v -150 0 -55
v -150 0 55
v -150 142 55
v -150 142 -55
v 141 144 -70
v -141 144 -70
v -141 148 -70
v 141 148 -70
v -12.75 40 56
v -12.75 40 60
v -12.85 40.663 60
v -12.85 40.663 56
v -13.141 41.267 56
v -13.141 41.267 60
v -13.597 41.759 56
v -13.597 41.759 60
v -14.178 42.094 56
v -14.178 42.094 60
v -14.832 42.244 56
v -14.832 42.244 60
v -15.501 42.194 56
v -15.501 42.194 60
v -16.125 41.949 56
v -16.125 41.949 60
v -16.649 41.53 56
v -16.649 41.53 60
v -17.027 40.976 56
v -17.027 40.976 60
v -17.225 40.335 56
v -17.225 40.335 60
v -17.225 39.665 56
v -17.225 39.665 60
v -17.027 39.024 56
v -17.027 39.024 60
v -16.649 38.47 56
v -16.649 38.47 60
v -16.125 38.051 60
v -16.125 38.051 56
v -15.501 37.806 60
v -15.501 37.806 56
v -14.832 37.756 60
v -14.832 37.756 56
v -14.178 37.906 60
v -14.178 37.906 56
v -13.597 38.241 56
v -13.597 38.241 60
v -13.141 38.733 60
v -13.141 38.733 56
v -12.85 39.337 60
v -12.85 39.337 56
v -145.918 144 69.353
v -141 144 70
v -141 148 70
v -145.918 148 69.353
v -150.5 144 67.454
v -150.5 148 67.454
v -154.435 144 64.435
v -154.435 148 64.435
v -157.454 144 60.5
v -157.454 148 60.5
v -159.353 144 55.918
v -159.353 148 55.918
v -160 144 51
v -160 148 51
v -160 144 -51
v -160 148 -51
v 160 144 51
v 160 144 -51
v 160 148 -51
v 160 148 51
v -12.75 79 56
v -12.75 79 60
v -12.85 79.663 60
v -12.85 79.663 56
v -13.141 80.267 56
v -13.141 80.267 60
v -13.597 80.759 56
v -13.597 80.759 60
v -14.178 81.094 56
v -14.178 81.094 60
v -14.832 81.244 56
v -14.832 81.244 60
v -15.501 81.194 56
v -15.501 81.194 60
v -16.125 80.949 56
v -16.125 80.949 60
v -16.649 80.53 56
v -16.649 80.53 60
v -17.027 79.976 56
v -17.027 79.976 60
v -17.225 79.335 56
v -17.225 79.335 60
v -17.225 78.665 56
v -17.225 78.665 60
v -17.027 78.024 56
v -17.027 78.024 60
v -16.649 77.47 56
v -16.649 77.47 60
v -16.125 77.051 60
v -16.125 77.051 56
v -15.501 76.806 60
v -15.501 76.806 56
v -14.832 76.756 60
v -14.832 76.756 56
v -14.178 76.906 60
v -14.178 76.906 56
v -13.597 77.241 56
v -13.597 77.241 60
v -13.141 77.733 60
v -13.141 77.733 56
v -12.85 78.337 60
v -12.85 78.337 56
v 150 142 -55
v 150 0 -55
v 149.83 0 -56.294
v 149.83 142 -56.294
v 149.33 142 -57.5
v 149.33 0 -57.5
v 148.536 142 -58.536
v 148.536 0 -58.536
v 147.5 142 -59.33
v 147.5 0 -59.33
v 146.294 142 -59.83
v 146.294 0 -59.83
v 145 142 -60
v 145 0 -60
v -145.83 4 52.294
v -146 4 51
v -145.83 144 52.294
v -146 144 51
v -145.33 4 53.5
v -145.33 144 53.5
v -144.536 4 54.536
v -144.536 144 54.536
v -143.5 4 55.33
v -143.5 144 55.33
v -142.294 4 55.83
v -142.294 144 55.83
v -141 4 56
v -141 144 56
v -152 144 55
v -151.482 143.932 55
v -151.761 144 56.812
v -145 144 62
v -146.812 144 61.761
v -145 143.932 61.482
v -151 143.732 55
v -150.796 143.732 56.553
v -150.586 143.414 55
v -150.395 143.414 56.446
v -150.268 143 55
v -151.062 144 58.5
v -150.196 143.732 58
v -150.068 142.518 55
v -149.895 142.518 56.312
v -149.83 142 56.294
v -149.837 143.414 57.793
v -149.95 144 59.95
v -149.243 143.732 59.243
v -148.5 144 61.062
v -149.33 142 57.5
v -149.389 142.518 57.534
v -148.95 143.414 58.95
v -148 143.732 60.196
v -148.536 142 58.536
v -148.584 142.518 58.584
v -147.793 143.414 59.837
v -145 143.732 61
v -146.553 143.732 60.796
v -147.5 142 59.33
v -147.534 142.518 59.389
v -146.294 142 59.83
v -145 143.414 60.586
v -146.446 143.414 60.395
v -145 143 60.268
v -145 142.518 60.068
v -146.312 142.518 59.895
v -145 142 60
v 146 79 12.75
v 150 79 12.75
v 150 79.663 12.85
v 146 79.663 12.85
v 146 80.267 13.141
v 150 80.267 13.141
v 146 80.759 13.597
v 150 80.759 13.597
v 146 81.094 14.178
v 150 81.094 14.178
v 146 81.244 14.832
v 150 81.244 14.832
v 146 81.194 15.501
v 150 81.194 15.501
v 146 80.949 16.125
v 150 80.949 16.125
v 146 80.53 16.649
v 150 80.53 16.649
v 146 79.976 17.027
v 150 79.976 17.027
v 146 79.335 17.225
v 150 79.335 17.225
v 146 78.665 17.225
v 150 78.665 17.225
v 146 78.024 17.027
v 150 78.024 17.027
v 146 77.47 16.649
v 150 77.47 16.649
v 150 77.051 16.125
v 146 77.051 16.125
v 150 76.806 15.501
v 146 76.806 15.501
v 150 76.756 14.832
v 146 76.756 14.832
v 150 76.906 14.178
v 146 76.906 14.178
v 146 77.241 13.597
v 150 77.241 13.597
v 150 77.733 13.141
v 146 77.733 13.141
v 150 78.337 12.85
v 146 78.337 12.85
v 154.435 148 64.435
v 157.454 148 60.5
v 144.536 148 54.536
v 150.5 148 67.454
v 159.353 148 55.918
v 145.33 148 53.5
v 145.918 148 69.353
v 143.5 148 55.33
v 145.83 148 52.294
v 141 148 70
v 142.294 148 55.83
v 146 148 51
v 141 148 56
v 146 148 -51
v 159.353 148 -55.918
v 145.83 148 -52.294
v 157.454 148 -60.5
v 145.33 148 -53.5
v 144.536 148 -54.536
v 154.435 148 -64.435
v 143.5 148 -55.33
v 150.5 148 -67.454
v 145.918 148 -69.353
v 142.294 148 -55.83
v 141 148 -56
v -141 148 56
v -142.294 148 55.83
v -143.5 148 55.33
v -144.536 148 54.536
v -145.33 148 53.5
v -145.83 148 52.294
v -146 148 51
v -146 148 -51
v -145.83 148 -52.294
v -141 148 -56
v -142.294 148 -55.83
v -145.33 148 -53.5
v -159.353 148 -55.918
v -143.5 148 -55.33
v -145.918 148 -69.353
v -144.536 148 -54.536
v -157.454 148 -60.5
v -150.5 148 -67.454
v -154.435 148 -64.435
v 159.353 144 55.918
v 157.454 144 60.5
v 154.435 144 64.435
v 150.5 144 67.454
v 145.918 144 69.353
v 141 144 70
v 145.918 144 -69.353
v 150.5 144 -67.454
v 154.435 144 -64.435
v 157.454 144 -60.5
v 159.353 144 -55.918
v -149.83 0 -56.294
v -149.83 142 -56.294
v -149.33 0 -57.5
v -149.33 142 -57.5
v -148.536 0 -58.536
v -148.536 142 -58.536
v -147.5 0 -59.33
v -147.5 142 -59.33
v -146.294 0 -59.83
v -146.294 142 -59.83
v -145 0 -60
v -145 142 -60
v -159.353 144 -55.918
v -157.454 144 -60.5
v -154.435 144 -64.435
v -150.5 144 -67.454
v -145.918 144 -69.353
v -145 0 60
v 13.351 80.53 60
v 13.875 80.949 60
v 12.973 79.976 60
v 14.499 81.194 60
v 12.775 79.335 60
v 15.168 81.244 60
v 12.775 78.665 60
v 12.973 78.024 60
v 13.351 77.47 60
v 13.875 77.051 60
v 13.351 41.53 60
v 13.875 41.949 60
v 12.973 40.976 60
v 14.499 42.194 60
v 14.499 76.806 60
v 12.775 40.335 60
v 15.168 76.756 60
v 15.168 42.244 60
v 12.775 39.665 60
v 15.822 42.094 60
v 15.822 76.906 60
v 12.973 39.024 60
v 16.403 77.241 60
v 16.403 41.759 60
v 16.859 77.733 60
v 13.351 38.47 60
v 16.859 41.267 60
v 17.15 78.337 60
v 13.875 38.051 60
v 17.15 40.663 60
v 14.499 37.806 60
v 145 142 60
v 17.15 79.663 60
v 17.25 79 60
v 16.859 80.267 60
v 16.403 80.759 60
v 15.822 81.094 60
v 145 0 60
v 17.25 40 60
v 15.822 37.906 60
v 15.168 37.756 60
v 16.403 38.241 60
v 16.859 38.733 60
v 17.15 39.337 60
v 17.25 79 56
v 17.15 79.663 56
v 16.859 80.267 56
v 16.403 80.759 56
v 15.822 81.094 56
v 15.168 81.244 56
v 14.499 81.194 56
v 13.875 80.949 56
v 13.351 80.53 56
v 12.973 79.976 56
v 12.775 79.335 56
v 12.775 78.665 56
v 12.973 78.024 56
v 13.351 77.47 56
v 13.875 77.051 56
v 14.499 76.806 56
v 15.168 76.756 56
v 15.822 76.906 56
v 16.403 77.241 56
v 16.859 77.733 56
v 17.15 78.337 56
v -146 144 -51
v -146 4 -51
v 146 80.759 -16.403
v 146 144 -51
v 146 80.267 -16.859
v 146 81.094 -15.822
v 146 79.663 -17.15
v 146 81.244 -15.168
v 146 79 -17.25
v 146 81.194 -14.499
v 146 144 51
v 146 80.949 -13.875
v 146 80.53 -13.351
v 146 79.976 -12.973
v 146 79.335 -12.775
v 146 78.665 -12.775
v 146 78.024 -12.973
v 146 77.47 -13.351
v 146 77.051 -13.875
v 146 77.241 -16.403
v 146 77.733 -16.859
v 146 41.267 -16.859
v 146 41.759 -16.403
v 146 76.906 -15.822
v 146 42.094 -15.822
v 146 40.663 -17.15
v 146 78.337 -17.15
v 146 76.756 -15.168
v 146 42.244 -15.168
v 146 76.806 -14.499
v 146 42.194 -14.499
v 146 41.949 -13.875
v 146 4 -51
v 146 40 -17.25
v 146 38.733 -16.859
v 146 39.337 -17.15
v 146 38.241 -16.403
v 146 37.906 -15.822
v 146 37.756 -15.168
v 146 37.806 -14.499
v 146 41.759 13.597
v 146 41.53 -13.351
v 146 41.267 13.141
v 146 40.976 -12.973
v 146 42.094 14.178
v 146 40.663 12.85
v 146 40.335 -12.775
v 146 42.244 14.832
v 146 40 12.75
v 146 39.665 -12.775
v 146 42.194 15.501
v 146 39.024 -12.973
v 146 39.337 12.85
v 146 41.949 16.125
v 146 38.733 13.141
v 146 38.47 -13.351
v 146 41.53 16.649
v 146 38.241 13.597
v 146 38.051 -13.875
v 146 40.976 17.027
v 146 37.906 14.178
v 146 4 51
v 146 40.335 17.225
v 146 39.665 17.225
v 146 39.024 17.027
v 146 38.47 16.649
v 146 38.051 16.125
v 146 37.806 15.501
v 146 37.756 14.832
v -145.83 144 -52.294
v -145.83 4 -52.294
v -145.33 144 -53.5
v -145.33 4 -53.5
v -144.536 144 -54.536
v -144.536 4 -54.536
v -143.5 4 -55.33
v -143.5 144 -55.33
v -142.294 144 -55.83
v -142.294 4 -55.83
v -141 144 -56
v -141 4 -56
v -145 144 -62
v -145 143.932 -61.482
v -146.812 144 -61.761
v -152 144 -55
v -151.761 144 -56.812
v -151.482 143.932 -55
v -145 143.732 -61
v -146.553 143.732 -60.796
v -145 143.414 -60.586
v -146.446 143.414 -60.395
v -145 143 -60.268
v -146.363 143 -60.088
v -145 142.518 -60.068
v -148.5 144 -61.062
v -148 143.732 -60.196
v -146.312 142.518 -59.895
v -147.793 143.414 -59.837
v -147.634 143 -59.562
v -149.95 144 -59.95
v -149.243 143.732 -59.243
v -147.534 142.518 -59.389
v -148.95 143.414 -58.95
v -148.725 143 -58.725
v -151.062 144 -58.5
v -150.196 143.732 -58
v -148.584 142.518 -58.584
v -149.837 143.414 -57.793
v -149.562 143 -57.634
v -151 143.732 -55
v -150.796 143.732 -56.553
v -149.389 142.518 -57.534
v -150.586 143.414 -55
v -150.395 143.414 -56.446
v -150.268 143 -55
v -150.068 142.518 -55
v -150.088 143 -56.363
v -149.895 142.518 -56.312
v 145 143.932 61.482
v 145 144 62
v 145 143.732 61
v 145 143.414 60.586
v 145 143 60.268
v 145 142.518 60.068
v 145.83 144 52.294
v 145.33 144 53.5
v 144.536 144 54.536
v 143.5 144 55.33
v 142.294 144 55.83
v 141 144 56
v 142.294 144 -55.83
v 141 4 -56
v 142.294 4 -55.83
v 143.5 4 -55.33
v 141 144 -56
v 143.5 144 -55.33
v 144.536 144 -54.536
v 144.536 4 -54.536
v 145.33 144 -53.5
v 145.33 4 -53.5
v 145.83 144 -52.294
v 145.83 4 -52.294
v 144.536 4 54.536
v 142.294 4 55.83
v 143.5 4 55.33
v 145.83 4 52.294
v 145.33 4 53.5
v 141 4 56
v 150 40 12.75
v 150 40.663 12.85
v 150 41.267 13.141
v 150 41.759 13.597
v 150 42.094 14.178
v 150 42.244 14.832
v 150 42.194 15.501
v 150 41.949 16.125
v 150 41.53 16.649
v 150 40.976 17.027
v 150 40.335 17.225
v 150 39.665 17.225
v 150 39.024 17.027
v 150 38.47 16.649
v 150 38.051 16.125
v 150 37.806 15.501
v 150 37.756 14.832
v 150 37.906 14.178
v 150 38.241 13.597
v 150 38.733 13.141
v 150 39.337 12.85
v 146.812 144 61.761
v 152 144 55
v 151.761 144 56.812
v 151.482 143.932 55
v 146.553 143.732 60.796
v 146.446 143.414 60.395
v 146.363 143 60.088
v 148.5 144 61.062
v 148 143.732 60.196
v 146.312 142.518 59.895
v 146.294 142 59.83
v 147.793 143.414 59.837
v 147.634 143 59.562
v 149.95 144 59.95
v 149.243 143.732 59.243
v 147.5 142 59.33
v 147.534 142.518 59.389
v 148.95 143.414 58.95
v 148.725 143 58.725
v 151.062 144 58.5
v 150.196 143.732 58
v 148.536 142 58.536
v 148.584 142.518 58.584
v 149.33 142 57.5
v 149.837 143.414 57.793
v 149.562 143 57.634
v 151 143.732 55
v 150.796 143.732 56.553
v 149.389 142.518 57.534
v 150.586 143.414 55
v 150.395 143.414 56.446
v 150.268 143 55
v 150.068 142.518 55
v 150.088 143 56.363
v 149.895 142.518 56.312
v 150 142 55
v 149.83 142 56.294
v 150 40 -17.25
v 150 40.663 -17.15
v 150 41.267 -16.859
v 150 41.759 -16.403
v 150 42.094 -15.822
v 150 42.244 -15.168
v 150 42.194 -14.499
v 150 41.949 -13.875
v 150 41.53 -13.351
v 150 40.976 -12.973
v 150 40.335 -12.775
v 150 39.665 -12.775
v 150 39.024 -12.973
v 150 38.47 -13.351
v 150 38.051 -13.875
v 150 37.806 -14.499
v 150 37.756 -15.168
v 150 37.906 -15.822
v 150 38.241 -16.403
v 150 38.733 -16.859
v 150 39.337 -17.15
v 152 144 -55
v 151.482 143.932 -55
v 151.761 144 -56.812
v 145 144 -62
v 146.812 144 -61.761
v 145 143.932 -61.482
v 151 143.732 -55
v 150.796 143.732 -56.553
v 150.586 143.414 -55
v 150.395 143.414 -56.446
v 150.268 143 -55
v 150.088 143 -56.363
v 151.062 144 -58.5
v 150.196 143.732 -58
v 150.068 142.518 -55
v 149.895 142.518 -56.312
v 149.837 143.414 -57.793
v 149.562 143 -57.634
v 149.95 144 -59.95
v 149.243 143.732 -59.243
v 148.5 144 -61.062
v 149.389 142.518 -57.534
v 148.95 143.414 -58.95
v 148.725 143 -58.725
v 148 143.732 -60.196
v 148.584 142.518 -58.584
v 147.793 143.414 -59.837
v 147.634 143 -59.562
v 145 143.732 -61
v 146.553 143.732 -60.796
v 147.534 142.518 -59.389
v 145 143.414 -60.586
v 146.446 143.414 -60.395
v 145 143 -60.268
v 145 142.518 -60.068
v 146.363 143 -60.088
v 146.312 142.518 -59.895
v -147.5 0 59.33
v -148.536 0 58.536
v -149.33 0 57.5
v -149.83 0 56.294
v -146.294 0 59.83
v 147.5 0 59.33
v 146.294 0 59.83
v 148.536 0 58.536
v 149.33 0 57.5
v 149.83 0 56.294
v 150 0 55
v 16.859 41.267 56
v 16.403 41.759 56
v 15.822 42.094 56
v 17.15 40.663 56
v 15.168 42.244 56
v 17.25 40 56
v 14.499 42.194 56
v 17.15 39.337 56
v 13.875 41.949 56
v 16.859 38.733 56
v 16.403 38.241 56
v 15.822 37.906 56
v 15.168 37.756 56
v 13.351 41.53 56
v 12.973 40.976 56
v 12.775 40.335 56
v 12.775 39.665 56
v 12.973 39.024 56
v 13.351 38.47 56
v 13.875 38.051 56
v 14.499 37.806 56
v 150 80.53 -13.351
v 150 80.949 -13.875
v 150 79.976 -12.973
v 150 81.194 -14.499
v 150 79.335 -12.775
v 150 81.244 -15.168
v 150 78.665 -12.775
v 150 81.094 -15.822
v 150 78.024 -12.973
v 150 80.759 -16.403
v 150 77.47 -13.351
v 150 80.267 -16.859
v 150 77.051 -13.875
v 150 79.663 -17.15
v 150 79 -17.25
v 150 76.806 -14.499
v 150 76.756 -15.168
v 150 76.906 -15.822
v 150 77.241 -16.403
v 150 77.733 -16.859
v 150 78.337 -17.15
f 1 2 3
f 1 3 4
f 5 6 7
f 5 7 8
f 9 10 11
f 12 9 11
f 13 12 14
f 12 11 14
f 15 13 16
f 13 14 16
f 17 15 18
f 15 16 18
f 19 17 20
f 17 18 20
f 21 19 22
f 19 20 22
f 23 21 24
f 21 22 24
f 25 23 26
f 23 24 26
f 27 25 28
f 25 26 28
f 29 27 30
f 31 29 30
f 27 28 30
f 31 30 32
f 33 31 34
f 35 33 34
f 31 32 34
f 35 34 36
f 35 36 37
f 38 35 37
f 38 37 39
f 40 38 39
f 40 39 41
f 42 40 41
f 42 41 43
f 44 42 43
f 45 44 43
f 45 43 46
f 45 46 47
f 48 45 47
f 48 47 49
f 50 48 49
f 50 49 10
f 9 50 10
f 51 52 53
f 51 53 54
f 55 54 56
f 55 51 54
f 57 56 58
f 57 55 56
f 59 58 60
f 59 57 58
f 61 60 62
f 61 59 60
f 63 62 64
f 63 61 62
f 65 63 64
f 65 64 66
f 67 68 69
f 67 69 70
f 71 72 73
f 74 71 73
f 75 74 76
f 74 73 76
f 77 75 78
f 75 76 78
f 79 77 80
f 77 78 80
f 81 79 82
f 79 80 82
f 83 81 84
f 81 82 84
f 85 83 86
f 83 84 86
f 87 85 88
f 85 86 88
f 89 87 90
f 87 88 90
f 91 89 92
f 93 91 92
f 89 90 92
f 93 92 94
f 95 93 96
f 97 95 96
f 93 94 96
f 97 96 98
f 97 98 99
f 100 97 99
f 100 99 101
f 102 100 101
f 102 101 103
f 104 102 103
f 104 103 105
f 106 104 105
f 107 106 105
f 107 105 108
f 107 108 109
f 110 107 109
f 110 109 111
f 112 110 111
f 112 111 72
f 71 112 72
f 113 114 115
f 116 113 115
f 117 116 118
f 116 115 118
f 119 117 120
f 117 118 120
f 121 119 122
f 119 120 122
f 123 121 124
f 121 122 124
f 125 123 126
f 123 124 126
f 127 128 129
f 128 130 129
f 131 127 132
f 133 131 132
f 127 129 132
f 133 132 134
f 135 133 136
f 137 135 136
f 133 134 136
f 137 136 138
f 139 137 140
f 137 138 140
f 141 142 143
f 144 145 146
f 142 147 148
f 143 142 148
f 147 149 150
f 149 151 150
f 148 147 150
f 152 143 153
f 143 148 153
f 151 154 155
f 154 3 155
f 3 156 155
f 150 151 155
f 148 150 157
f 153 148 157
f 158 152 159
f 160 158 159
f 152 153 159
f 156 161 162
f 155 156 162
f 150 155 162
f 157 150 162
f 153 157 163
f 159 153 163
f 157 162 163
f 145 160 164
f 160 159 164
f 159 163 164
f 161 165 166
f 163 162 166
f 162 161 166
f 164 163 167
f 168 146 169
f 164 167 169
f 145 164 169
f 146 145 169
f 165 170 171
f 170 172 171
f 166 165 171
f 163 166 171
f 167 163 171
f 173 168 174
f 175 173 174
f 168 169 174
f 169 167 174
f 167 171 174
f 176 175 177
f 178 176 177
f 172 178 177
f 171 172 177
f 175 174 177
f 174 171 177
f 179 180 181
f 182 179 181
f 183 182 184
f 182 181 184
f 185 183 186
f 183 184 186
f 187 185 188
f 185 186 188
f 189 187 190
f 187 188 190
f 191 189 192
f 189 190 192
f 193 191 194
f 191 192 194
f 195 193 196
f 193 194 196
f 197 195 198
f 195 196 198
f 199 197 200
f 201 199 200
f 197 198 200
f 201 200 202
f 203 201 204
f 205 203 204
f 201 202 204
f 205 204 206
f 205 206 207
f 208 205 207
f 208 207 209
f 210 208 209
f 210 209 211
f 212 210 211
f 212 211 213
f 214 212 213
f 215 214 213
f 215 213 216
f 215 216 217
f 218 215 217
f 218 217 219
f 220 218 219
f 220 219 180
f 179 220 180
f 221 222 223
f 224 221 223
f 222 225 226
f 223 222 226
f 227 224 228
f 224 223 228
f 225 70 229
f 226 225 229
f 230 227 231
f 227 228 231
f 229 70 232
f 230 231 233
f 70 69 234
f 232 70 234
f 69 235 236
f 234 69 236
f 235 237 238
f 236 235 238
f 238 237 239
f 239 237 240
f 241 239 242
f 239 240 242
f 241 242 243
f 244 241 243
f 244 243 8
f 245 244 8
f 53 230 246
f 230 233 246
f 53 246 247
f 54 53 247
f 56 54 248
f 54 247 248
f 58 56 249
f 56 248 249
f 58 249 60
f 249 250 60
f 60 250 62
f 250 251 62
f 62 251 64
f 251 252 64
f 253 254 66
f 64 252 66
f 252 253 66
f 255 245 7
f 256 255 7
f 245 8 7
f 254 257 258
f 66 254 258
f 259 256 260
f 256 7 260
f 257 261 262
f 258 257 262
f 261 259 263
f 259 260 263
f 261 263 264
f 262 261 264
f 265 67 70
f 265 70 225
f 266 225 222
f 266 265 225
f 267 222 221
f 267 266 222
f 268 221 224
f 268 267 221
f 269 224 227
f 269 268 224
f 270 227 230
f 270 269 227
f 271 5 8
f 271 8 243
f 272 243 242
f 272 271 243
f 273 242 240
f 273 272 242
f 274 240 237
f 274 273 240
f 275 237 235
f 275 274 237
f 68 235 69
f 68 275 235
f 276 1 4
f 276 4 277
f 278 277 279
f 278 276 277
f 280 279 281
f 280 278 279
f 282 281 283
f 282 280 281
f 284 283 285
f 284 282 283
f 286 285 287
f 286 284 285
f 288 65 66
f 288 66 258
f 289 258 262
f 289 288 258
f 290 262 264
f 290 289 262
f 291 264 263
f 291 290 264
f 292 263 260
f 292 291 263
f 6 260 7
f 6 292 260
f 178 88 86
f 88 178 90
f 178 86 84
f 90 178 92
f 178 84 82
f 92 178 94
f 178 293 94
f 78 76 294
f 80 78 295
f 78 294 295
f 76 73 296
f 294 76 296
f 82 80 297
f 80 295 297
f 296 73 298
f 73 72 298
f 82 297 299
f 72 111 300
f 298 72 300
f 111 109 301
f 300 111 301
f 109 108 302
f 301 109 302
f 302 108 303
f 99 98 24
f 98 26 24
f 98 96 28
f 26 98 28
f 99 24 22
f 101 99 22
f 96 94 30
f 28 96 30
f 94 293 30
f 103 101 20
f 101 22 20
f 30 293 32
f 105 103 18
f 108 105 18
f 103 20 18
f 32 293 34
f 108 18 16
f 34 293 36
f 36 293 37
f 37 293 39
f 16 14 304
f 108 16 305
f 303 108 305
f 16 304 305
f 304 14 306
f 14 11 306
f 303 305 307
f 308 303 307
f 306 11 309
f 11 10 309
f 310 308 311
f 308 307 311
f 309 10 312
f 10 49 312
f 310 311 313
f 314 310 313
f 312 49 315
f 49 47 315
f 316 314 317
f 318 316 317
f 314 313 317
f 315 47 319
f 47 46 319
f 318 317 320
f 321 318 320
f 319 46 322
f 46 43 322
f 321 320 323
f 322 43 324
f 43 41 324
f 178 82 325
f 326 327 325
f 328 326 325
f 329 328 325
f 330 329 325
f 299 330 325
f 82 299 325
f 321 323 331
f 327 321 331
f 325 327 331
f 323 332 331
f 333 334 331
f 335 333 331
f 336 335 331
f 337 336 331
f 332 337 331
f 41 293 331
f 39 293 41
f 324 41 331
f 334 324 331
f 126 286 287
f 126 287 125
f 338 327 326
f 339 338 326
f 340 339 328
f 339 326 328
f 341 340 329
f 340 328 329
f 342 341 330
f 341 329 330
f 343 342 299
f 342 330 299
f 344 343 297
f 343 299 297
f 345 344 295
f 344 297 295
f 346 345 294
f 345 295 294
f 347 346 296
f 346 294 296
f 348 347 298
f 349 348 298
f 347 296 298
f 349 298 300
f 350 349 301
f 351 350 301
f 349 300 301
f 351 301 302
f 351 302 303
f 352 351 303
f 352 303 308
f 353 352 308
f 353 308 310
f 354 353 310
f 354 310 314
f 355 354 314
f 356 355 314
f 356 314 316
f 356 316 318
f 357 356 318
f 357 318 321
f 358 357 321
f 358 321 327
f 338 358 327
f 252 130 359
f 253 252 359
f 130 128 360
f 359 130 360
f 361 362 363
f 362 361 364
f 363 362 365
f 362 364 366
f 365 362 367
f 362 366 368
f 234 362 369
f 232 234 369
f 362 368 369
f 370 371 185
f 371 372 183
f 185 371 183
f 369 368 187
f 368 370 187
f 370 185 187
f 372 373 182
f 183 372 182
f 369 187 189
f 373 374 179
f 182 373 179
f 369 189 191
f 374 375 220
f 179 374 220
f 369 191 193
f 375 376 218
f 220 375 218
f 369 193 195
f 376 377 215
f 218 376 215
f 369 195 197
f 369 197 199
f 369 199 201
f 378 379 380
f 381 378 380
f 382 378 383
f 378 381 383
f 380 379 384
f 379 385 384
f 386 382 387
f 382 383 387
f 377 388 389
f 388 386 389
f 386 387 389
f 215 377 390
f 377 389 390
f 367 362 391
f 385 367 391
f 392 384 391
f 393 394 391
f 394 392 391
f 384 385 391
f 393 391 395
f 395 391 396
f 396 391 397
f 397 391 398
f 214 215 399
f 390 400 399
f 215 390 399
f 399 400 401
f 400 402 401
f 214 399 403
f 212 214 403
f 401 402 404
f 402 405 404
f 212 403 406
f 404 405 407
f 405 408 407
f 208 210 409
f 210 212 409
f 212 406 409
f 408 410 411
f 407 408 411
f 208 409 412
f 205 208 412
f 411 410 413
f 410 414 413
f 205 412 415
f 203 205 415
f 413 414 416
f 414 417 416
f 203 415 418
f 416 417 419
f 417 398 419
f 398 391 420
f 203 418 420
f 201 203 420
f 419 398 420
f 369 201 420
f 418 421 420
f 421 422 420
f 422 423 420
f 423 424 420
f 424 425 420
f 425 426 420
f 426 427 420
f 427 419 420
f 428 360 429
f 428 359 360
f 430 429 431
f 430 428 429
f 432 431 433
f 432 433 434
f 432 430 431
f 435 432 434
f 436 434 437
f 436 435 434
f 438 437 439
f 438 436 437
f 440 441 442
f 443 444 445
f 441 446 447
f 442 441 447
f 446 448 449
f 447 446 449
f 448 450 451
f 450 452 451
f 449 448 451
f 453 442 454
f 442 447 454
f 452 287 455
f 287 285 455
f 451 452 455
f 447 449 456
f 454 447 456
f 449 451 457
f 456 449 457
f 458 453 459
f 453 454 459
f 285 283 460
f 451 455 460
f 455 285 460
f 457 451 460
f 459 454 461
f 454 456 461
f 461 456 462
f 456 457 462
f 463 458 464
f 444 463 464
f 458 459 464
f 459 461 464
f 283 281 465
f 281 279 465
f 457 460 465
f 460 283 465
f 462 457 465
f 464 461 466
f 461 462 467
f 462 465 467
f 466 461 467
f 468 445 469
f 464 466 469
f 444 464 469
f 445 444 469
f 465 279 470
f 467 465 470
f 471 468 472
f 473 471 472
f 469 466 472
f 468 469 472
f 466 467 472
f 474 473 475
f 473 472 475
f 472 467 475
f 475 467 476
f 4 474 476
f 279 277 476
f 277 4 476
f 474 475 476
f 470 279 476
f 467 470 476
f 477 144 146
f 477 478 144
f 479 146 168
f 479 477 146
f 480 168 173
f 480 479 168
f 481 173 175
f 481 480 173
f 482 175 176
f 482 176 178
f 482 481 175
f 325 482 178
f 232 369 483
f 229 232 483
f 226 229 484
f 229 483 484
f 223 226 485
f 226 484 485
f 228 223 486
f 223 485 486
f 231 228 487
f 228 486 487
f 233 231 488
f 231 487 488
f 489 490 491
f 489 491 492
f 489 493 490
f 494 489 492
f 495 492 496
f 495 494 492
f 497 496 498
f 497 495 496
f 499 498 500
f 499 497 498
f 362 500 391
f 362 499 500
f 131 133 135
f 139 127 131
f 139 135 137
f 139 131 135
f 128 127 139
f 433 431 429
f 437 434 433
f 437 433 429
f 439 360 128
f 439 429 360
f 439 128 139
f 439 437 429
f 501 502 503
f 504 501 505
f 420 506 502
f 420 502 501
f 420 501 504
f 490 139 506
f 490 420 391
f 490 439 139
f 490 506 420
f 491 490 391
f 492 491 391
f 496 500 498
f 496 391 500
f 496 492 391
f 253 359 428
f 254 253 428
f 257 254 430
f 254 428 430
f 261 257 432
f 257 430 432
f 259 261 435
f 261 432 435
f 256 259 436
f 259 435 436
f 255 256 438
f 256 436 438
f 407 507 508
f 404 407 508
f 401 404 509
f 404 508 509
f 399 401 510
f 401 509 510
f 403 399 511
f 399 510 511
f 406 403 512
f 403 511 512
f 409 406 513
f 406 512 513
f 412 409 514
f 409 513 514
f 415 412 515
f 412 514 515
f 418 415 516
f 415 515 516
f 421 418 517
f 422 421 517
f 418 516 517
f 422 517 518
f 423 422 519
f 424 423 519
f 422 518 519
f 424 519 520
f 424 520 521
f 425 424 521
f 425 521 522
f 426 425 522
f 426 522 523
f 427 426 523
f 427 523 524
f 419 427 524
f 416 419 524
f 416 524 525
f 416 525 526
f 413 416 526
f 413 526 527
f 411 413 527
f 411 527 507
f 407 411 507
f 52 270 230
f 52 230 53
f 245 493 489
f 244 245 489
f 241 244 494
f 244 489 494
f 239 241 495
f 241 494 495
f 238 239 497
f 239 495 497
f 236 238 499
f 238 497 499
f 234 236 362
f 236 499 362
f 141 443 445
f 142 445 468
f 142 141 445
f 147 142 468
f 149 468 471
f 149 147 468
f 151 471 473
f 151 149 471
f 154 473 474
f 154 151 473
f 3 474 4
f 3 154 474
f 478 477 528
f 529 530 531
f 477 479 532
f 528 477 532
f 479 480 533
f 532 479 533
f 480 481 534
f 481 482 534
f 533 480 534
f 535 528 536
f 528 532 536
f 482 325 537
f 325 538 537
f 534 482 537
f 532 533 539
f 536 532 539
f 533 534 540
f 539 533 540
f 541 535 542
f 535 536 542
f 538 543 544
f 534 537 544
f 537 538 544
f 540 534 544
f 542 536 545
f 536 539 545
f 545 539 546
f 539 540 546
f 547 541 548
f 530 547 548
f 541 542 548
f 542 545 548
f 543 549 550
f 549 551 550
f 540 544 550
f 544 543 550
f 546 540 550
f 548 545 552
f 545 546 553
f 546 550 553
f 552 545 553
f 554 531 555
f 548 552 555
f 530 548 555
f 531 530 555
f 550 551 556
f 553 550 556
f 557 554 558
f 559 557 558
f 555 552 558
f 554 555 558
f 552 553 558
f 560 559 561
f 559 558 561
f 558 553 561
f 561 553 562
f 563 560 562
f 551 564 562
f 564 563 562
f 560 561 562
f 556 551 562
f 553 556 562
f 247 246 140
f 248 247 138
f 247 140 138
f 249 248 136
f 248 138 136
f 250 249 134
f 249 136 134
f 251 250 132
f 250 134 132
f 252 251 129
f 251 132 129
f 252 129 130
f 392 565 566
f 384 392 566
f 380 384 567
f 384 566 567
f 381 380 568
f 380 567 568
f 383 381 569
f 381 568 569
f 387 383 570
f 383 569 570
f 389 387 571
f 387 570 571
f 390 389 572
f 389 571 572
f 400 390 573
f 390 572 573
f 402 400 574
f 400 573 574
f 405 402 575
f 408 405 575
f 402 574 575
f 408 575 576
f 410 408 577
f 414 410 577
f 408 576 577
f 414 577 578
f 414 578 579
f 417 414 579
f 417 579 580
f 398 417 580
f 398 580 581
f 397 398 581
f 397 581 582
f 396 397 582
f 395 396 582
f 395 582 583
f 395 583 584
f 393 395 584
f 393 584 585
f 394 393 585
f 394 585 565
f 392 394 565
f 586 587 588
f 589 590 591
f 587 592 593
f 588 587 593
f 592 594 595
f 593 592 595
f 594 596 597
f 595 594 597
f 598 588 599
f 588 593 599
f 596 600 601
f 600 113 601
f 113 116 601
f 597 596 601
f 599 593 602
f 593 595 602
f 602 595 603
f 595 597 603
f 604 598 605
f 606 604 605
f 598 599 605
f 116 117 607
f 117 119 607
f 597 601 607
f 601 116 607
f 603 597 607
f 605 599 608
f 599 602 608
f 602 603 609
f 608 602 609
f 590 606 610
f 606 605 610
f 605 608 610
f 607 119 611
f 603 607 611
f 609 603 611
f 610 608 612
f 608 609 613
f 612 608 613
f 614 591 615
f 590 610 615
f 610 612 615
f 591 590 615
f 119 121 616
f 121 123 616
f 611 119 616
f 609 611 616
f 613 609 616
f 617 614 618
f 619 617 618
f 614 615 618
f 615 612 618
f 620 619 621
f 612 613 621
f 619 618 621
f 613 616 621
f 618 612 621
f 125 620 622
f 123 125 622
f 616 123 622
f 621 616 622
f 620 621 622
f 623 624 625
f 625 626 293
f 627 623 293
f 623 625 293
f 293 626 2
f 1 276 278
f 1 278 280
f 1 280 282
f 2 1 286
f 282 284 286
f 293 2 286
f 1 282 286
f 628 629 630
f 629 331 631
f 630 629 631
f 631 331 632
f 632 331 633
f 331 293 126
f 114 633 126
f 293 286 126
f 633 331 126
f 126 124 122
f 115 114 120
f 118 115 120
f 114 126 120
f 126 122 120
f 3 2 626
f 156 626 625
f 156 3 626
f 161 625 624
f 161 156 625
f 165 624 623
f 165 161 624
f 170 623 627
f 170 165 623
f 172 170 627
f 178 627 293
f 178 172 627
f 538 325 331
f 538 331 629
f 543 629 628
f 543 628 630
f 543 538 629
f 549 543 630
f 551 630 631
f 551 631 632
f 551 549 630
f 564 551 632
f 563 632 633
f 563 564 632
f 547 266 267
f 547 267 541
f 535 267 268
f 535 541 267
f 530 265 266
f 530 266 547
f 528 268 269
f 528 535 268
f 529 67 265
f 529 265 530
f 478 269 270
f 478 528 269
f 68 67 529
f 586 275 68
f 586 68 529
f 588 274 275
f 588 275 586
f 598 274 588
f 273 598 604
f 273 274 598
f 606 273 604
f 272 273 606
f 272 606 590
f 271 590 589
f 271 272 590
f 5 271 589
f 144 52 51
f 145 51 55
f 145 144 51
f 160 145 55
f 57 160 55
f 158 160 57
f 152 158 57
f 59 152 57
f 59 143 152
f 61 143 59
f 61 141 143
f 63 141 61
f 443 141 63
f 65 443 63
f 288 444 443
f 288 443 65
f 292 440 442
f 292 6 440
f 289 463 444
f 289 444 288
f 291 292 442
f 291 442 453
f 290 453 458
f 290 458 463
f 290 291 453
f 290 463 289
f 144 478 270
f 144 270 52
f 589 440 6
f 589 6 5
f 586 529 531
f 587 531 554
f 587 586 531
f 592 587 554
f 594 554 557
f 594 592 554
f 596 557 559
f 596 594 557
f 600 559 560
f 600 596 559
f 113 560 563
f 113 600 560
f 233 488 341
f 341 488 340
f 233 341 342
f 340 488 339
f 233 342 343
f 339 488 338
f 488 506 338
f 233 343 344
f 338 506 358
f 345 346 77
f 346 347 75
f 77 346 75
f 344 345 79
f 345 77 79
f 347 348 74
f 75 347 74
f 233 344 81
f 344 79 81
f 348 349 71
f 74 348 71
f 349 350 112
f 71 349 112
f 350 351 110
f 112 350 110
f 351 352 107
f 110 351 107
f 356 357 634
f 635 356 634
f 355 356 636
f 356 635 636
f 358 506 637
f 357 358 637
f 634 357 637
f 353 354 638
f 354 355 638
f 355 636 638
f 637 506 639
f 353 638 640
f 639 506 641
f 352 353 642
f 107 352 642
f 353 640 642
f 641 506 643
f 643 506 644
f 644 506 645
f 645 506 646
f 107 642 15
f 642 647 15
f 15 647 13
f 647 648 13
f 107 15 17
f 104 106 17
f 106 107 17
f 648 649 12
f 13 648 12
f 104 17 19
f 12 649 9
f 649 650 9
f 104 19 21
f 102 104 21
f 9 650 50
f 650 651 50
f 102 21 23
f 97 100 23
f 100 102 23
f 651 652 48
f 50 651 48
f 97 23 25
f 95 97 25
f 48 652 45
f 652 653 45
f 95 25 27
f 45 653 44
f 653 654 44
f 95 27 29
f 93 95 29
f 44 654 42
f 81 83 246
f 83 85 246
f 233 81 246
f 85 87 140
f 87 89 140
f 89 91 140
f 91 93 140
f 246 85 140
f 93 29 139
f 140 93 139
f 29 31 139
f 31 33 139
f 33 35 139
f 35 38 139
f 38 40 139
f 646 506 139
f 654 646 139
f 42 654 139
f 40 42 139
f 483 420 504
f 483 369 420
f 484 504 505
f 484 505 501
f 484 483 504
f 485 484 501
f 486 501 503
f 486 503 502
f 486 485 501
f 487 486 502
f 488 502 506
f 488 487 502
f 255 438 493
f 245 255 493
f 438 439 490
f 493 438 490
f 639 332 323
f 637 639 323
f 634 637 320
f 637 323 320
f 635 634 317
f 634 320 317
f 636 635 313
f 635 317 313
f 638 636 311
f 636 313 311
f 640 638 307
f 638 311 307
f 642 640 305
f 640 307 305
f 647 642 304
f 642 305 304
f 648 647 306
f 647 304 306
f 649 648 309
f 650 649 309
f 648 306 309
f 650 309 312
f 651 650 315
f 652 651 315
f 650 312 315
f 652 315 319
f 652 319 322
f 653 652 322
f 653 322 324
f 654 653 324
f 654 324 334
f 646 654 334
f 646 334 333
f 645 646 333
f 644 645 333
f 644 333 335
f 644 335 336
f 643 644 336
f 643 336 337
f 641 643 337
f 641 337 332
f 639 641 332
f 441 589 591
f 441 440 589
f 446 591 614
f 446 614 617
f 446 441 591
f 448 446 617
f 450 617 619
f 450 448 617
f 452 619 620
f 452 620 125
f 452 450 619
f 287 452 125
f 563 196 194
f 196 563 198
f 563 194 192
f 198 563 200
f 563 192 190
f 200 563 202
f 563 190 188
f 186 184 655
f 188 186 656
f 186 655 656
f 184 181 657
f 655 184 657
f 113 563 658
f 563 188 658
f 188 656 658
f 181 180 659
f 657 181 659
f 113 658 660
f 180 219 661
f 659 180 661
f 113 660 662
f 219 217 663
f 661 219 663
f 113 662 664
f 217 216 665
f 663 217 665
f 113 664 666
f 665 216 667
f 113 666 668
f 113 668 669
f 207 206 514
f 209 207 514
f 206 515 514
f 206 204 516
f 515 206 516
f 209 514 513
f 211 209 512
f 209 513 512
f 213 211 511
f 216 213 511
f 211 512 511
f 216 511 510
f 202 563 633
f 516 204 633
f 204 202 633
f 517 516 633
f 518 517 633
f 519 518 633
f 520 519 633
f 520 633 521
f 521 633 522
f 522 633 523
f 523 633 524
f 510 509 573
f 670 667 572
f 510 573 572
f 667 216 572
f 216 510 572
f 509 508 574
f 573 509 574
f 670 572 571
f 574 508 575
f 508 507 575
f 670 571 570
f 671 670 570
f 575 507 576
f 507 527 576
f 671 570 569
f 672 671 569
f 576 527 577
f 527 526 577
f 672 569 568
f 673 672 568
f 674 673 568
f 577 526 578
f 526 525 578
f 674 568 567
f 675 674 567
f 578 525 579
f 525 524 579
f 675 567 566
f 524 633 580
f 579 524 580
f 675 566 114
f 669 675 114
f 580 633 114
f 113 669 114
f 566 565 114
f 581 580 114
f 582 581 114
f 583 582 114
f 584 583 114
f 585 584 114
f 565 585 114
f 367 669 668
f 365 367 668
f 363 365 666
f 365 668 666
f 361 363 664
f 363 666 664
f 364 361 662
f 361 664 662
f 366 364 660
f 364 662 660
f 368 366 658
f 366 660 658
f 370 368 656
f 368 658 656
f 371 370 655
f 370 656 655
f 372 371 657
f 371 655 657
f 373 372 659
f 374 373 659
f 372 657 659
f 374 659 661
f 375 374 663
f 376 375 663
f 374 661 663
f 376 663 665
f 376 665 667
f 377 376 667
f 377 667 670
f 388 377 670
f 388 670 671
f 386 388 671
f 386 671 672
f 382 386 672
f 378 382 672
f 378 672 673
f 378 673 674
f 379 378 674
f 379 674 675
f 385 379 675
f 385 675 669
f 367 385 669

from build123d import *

# Parameters (mm, degrees)
SKETCH1_W           = 300
SKETCH1_H           = 120
BOSS_EXTRUDE1_DEPTH = 4
SKETCH2_W           = 300
SKETCH2_H           = 120
SKETCH2_W_2         = 292
SKETCH2_H_2         = 112
BOSS_EXTRUDE2_DEPTH = 140
FILLET1_R           = 5
BOSS_EXTRUDE3_DEPTH = 4
FILLET2_R           = 2
CUT_EXTRUDE1_REACH  = 312
SKETCH4_R           = 2.25
CUT_EXTRUDE2_REACH  = 132
SKETCH5_R           = 2.25


with BuildPart() as part:
    # Sketch1 → Boss-Extrude1 (new body)
    with BuildSketch(Plane(origin=(0, 0, 0), x_dir=(1, 0, 0), z_dir=(0, 1, 0))):
        Rectangle(SKETCH1_W, SKETCH1_H)
    extrude(amount=BOSS_EXTRUDE1_DEPTH)

    # Sketch2 → Boss-Extrude2 (add)
    with BuildSketch(Plane(origin=(0, 4, 0), x_dir=(1, 0, 0), z_dir=(0, 1, 0))):
        Rectangle(SKETCH2_W, SKETCH2_H)
        Rectangle(SKETCH2_W_2, SKETCH2_H_2, mode=Mode.SUBTRACT)
    extrude(amount=BOSS_EXTRUDE2_DEPTH)

    # Fillet1
    fillet1_edges = [part.edges().sort_by_distance(p)[0] for p in [
        (-146, 74, 56),
        (146, 74, 56),
        (146, 74, -56),
        (-146, 74, -56),
        (-150, 72, -60),
        (150, 72, -60),
        (150, 72, 60),
        (-150, 72, 60),
    ]]
    fillet(fillet1_edges, radius=FILLET1_R)

    # Sketch3 → Boss-Extrude3 (add)
    with BuildSketch(Plane(origin=(0, 144, 0), x_dir=(1, 0, 0), z_dir=(0, 1, 0))):
        with BuildLine():
            Line((-141, 70), (141, 70))
            ThreePointArc((141, 70), (154.435028843, 64.435028843), (160, 51))
            Line((160, 51), (160, -51))
            ThreePointArc((160, -51), (154.435028843, -64.435028843), (141, -70))
            Line((141, -70), (-141, -70))
            ThreePointArc((-141, -70), (-154.435028843, -64.435028843), (-160, -51))
            Line((-160, -51), (-160, 51))
            ThreePointArc((-160, 51), (-154.435028843, 64.435028843), (-141, 70))
        make_face()
        with BuildLine():
            Line((-141, 56), (141, 56))
            ThreePointArc((141, 56), (144.535533906, 54.535533906), (146, 51))
            Line((146, 51), (146, -51))
            ThreePointArc((146, -51), (144.535533906, -54.535533906), (141, -56))
            Line((141, -56), (-141, -56))
            ThreePointArc((-141, -56), (-144.535533906, -54.535533906), (-146, -51))
            Line((-146, -51), (-146, 51))
            ThreePointArc((-146, 51), (-144.535533906, 54.535533906), (-141, 56))
        make_face(mode=Mode.SUBTRACT)
    extrude(amount=BOSS_EXTRUDE3_DEPTH)

    # Fillet2
    fillet2_edges = [part.edges().sort_by_distance(p)[0] for p in [
        (0, 144, 60),
        (-150, 144, 0),
        (150, 144, 0),
        (0, 144, -60),
        (-148.535533906, 144, -58.535533906),
        (148.535533906, 144, -58.535533906),
        (148.535533906, 144, 58.535533906),
        (-148.535533906, 144, 58.535533906),
    ]]
    fillet(fillet2_edges, radius=FILLET2_R)

    # Sketch4 → Cut-Extrude1 (cut, up to next)
    with BuildSketch(Plane(origin=(150, 0, 0), x_dir=(0, 0, -1), z_dir=(1, 0, 0)), mode=Mode.PRIVATE) as cut_extrude1_sk1:
        with Locations((-15, 79)):
            Circle(SKETCH4_R)
    cut_extrude1_tool1 = extrude(cut_extrude1_sk1.sketch, amount=-CUT_EXTRUDE1_REACH, mode=Mode.PRIVATE) & part.part
    add(cut_extrude1_tool1.solids().sort_by_distance((150, 79, 15))[0], mode=Mode.SUBTRACT)
    # Sketch4 → Cut-Extrude1 (cut, up to next)
    with BuildSketch(Plane(origin=(150, 0, 0), x_dir=(0, 0, -1), z_dir=(1, 0, 0)), mode=Mode.PRIVATE) as cut_extrude1_sk2:
        with Locations((15, 79)):
            Circle(SKETCH4_R)
    cut_extrude1_tool2 = extrude(cut_extrude1_sk2.sketch, amount=-CUT_EXTRUDE1_REACH, mode=Mode.PRIVATE) & part.part
    add(cut_extrude1_tool2.solids().sort_by_distance((150, 79, -15))[0], mode=Mode.SUBTRACT)
    # Sketch4 → Cut-Extrude1 (cut, up to next)
    with BuildSketch(Plane(origin=(150, 0, 0), x_dir=(0, 0, -1), z_dir=(1, 0, 0)), mode=Mode.PRIVATE) as cut_extrude1_sk3:
        with Locations((15, 40)):
            Circle(SKETCH4_R)
    cut_extrude1_tool3 = extrude(cut_extrude1_sk3.sketch, amount=-CUT_EXTRUDE1_REACH, mode=Mode.PRIVATE) & part.part
    add(cut_extrude1_tool3.solids().sort_by_distance((150, 40, -15))[0], mode=Mode.SUBTRACT)
    # Sketch4 → Cut-Extrude1 (cut, up to next)
    with BuildSketch(Plane(origin=(150, 0, 0), x_dir=(0, 0, -1), z_dir=(1, 0, 0)), mode=Mode.PRIVATE) as cut_extrude1_sk4:
        with Locations((-15, 40)):
            Circle(SKETCH4_R)
    cut_extrude1_tool4 = extrude(cut_extrude1_sk4.sketch, amount=-CUT_EXTRUDE1_REACH, mode=Mode.PRIVATE) & part.part
    add(cut_extrude1_tool4.solids().sort_by_distance((150, 40, 15))[0], mode=Mode.SUBTRACT)

    # Sketch5 → Cut-Extrude2 (cut, up to next)
    with BuildSketch(Plane.XY.offset(60), mode=Mode.PRIVATE) as cut_extrude2_sk1:
        with Locations((15, 79)):
            Circle(SKETCH5_R)
    cut_extrude2_tool1 = extrude(cut_extrude2_sk1.sketch, amount=-CUT_EXTRUDE2_REACH, mode=Mode.PRIVATE) & part.part
    add(cut_extrude2_tool1.solids().sort_by_distance((15, 79, 60))[0], mode=Mode.SUBTRACT)
    # Sketch5 → Cut-Extrude2 (cut, up to next)
    with BuildSketch(Plane.XY.offset(60), mode=Mode.PRIVATE) as cut_extrude2_sk2:
        with Locations((-15, 79)):
            Circle(SKETCH5_R)
    cut_extrude2_tool2 = extrude(cut_extrude2_sk2.sketch, amount=-CUT_EXTRUDE2_REACH, mode=Mode.PRIVATE) & part.part
    add(cut_extrude2_tool2.solids().sort_by_distance((-15, 79, 60))[0], mode=Mode.SUBTRACT)
    # Sketch5 → Cut-Extrude2 (cut, up to next)
    with BuildSketch(Plane.XY.offset(60), mode=Mode.PRIVATE) as cut_extrude2_sk3:
        with Locations((-15, 40)):
            Circle(SKETCH5_R)
    cut_extrude2_tool3 = extrude(cut_extrude2_sk3.sketch, amount=-CUT_EXTRUDE2_REACH, mode=Mode.PRIVATE) & part.part
    add(cut_extrude2_tool3.solids().sort_by_distance((-15, 40, 60))[0], mode=Mode.SUBTRACT)
    # Sketch5 → Cut-Extrude2 (cut, up to next)
    with BuildSketch(Plane.XY.offset(60), mode=Mode.PRIVATE) as cut_extrude2_sk4:
        with Locations((15, 40)):
            Circle(SKETCH5_R)
    cut_extrude2_tool4 = extrude(cut_extrude2_sk4.sketch, amount=-CUT_EXTRUDE2_REACH, mode=Mode.PRIVATE) & part.part
    add(cut_extrude2_tool4.solids().sort_by_distance((15, 40, 60))[0], mode=Mode.SUBTRACT)


solid = part.part
